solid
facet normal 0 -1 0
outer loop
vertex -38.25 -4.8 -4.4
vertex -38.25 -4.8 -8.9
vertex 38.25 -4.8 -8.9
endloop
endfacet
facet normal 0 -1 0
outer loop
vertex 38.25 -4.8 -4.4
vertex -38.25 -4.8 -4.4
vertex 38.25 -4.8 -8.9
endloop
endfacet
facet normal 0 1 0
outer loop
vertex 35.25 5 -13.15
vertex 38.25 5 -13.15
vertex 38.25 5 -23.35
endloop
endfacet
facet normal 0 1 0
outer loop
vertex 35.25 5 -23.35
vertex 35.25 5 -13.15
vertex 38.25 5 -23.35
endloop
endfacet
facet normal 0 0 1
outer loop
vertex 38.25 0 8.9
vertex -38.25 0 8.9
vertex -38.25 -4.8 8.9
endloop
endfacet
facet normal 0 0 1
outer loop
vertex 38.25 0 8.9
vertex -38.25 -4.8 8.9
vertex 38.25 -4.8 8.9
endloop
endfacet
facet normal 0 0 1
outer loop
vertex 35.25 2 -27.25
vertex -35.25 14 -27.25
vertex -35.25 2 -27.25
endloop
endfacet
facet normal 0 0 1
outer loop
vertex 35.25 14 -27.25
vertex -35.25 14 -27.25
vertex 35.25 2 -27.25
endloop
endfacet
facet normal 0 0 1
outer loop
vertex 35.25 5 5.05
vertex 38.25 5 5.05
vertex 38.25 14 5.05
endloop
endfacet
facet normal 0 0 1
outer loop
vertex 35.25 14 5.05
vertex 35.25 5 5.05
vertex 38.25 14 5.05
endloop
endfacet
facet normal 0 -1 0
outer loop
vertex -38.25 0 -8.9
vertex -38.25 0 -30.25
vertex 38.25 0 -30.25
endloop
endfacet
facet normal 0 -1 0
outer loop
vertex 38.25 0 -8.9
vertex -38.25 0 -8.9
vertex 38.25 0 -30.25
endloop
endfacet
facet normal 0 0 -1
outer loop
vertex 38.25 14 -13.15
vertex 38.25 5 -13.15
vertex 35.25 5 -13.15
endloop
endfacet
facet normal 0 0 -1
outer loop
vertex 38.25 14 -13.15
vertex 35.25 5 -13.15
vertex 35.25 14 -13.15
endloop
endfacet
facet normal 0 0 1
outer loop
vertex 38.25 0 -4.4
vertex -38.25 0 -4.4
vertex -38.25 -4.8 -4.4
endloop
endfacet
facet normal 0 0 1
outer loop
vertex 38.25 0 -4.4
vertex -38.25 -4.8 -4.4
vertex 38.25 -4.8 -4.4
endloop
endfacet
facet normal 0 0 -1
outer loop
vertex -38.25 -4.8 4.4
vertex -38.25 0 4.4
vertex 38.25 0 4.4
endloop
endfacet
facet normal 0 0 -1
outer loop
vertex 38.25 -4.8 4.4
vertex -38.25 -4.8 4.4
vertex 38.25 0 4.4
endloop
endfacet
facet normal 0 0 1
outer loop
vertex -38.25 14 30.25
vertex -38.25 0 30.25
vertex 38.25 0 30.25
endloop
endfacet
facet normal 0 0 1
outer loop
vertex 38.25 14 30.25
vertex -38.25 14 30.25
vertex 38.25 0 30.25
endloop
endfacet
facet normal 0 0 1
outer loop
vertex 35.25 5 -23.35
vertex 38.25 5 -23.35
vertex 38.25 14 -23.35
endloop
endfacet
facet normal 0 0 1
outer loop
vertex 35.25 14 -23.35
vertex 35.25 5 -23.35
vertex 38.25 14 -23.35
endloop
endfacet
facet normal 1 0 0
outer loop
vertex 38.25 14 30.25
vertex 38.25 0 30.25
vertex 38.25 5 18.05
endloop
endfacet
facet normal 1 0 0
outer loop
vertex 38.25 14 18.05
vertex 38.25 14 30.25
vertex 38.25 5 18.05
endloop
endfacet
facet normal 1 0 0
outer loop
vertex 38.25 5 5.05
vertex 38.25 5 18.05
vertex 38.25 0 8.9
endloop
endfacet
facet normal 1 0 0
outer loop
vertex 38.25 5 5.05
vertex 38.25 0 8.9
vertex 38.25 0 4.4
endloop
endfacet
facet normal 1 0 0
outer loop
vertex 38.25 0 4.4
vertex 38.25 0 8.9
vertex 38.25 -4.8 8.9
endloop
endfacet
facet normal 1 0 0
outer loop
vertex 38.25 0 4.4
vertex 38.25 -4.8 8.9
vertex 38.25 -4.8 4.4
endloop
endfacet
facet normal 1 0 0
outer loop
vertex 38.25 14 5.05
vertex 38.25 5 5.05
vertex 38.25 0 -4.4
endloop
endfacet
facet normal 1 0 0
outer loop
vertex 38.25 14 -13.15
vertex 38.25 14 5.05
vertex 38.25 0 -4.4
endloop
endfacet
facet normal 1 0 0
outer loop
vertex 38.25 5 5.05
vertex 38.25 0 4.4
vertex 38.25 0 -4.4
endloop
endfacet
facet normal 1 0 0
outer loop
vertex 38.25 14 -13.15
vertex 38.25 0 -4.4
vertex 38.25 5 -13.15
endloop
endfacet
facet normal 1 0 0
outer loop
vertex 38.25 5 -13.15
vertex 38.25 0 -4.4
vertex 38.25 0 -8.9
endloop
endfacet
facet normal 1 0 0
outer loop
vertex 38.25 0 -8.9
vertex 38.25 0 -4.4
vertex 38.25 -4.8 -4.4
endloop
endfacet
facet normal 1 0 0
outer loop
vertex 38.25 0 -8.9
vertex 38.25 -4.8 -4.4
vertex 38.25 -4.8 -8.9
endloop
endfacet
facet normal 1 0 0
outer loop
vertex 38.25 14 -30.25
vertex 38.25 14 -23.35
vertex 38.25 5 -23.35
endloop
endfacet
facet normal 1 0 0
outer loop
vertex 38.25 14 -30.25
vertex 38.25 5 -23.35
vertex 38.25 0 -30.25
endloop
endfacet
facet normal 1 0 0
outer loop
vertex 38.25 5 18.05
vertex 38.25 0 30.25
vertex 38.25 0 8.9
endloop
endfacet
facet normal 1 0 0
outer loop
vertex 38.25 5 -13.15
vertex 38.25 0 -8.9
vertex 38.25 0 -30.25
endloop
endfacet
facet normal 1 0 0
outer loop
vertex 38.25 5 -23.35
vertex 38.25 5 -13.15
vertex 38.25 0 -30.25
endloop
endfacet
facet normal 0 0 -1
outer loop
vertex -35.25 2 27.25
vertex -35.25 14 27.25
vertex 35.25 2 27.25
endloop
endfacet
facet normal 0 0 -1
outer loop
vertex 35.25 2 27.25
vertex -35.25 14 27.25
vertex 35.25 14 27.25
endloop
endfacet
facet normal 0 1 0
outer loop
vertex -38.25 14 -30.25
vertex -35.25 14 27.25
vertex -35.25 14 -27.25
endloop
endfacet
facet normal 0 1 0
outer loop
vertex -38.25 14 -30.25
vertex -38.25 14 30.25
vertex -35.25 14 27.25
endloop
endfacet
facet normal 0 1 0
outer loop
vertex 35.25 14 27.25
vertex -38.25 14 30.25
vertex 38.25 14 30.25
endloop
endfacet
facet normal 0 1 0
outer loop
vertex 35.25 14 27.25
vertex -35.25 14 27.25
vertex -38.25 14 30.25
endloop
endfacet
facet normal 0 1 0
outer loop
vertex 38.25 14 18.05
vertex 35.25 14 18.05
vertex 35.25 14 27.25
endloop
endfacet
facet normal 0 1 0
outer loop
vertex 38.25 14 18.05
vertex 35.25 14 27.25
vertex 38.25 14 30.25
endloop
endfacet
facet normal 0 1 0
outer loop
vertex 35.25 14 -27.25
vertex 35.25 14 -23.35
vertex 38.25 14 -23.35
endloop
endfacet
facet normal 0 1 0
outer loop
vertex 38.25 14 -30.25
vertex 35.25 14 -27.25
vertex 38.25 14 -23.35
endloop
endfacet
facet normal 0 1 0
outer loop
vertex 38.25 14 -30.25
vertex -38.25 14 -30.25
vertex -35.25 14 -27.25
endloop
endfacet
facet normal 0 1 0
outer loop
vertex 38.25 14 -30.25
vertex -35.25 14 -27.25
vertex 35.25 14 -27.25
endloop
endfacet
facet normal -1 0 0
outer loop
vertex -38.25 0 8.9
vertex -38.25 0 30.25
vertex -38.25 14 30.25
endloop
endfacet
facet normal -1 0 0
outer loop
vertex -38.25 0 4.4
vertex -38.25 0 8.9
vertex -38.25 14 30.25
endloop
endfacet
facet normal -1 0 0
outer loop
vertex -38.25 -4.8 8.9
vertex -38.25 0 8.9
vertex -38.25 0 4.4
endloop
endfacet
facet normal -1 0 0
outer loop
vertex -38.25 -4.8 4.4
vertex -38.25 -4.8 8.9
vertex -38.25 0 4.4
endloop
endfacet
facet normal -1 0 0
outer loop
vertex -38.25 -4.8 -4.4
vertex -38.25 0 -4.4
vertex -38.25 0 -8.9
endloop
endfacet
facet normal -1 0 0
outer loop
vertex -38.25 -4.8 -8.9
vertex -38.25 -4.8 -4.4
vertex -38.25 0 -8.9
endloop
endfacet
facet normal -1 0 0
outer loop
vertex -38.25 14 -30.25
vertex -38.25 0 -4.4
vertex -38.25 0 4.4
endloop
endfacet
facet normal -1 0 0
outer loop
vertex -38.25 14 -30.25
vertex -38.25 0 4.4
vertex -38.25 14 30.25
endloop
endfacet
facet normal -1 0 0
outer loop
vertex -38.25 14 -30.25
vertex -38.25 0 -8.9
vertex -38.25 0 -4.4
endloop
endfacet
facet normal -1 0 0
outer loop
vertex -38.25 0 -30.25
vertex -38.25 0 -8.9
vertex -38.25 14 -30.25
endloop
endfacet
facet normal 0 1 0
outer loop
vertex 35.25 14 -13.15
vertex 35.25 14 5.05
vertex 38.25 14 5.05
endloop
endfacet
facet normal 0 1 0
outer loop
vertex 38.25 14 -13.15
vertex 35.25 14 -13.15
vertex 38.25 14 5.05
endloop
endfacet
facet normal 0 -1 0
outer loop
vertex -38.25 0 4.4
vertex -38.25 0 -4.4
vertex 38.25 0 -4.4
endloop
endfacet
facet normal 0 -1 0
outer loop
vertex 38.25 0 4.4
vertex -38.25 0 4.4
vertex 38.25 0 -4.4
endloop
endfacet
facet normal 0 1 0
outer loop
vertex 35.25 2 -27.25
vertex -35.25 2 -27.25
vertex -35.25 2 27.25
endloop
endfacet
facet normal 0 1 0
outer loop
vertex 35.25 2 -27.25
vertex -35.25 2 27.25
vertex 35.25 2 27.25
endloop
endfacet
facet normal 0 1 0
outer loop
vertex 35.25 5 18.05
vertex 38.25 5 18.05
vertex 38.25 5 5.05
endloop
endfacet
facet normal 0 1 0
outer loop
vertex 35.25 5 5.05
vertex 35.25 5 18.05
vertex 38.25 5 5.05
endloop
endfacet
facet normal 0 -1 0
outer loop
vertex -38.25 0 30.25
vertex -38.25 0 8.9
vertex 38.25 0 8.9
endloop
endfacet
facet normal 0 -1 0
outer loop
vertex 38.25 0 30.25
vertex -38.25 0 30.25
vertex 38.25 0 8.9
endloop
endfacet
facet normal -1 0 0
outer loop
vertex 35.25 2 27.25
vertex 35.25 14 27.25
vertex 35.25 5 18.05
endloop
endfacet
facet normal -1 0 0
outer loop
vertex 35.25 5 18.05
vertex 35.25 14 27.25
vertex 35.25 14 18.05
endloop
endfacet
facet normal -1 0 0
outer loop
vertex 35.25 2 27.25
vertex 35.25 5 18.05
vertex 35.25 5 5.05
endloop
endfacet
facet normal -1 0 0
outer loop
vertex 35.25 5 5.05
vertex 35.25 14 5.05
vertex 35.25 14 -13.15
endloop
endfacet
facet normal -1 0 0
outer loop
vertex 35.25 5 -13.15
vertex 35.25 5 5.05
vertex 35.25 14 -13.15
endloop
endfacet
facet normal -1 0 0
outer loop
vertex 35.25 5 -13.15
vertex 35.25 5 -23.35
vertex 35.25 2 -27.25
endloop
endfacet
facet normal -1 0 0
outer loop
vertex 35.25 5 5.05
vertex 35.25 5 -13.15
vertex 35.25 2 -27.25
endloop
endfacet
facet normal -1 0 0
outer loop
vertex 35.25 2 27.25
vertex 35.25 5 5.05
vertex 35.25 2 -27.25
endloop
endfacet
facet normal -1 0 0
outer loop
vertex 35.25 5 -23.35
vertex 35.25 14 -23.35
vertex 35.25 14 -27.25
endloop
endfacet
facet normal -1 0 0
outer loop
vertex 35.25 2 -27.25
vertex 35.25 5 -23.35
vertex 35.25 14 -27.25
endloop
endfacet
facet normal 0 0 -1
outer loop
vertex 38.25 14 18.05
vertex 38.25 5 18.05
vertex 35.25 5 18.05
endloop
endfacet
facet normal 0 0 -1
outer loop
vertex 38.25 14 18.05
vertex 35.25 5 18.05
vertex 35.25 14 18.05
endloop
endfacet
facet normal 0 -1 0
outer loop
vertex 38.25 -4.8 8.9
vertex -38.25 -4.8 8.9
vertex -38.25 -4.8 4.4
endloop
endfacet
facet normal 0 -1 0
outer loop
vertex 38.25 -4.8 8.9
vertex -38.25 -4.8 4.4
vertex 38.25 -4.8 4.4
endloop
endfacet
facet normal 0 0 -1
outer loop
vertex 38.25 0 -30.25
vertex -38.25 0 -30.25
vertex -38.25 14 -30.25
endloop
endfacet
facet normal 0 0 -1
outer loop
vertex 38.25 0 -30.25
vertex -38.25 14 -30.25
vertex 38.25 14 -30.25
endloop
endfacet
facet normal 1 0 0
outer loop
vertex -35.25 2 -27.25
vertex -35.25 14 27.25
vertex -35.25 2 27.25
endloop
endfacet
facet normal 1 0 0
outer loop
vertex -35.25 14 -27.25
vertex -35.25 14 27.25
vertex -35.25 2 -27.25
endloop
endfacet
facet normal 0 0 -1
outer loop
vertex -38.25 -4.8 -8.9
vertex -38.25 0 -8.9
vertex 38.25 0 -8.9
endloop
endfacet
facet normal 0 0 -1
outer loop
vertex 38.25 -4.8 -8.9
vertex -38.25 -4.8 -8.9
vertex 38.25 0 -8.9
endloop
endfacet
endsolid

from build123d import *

# Parameters (mm, degrees)
SKETCH1_W           = 76.5
SKETCH1_H           = 60.5
BOSS_EXTRUDE1_DEPTH = 14
SKETCH2_W           = 70.5
SKETCH2_H           = 54.5
CUT_EXTRUDE1_DEPTH  = 12
CUT_EXTRUDE2_REACH  = 85.446
SKETCH4_W           = 13
SKETCH4_H           = 9
SKETCH4_W_2         = 10.2
SKETCH5_W           = 76.5
SKETCH5_H           = 4.5
BOSS_EXTRUDE3_DEPTH = 4.8


with BuildPart() as part:
    # Sketch1 → Boss-Extrude1 (new body)
    with BuildSketch(Plane(origin=(0, 0, 0), x_dir=(1, 0, 0), z_dir=(0, 1, 0))):
        Rectangle(SKETCH1_W, SKETCH1_H)
    extrude(amount=BOSS_EXTRUDE1_DEPTH)

    # Sketch2 → Cut-Extrude1 (cut)
    with BuildSketch(Plane(origin=(0, 14, 0), x_dir=(1, 0, 0), z_dir=(0, 1, 0))):
        Rectangle(SKETCH2_W, SKETCH2_H)
    extrude(amount=-CUT_EXTRUDE1_DEPTH, mode=Mode.SUBTRACT)

    # Sketch4 → Cut-Extrude2 (cut, up to next)
    with BuildSketch(Plane(origin=(38.25, 0, 0), x_dir=(0, 0, -1), z_dir=(1, 0, 0)), mode=Mode.PRIVATE) as cut_extrude2_sk1:
        with Locations((-11.55, 9.5)):
            Rectangle(SKETCH4_W, SKETCH4_H)
    cut_extrude2_tool1 = extrude(cut_extrude2_sk1.sketch, amount=-CUT_EXTRUDE2_REACH, mode=Mode.PRIVATE) & part.part
    # Sketch4 → Cut-Extrude2 (cut, up to next)
    with BuildSketch(Plane(origin=(38.25, 0, 0), x_dir=(0, 0, -1), z_dir=(1, 0, 0)), mode=Mode.PRIVATE) as cut_extrude2_sk2:
        with Locations((18.25, 9.5)):
            Rectangle(SKETCH4_W_2, SKETCH4_H)
    cut_extrude2_tool2 = extrude(cut_extrude2_sk2.sketch, amount=-CUT_EXTRUDE2_REACH, mode=Mode.PRIVATE) & part.part
    add(cut_extrude2_tool1.solids().sort_by_distance((38.25, 9.5, 11.55))[0], mode=Mode.SUBTRACT)
    add(cut_extrude2_tool2.solids().sort_by_distance((38.25, 9.5, -18.25))[0], mode=Mode.SUBTRACT)

    # Sketch5 → Boss-Extrude3 (add)
    with BuildSketch(Plane.XZ):
        with Locations((0, 6.65)):
            Rectangle(SKETCH5_W, SKETCH5_H)
    boss_extrude3 = extrude(amount=BOSS_EXTRUDE3_DEPTH)

    # Mirror1: Boss-Extrude3 across plane
    add(boss_extrude3.mirror(Plane.XY))


solid = part.part
